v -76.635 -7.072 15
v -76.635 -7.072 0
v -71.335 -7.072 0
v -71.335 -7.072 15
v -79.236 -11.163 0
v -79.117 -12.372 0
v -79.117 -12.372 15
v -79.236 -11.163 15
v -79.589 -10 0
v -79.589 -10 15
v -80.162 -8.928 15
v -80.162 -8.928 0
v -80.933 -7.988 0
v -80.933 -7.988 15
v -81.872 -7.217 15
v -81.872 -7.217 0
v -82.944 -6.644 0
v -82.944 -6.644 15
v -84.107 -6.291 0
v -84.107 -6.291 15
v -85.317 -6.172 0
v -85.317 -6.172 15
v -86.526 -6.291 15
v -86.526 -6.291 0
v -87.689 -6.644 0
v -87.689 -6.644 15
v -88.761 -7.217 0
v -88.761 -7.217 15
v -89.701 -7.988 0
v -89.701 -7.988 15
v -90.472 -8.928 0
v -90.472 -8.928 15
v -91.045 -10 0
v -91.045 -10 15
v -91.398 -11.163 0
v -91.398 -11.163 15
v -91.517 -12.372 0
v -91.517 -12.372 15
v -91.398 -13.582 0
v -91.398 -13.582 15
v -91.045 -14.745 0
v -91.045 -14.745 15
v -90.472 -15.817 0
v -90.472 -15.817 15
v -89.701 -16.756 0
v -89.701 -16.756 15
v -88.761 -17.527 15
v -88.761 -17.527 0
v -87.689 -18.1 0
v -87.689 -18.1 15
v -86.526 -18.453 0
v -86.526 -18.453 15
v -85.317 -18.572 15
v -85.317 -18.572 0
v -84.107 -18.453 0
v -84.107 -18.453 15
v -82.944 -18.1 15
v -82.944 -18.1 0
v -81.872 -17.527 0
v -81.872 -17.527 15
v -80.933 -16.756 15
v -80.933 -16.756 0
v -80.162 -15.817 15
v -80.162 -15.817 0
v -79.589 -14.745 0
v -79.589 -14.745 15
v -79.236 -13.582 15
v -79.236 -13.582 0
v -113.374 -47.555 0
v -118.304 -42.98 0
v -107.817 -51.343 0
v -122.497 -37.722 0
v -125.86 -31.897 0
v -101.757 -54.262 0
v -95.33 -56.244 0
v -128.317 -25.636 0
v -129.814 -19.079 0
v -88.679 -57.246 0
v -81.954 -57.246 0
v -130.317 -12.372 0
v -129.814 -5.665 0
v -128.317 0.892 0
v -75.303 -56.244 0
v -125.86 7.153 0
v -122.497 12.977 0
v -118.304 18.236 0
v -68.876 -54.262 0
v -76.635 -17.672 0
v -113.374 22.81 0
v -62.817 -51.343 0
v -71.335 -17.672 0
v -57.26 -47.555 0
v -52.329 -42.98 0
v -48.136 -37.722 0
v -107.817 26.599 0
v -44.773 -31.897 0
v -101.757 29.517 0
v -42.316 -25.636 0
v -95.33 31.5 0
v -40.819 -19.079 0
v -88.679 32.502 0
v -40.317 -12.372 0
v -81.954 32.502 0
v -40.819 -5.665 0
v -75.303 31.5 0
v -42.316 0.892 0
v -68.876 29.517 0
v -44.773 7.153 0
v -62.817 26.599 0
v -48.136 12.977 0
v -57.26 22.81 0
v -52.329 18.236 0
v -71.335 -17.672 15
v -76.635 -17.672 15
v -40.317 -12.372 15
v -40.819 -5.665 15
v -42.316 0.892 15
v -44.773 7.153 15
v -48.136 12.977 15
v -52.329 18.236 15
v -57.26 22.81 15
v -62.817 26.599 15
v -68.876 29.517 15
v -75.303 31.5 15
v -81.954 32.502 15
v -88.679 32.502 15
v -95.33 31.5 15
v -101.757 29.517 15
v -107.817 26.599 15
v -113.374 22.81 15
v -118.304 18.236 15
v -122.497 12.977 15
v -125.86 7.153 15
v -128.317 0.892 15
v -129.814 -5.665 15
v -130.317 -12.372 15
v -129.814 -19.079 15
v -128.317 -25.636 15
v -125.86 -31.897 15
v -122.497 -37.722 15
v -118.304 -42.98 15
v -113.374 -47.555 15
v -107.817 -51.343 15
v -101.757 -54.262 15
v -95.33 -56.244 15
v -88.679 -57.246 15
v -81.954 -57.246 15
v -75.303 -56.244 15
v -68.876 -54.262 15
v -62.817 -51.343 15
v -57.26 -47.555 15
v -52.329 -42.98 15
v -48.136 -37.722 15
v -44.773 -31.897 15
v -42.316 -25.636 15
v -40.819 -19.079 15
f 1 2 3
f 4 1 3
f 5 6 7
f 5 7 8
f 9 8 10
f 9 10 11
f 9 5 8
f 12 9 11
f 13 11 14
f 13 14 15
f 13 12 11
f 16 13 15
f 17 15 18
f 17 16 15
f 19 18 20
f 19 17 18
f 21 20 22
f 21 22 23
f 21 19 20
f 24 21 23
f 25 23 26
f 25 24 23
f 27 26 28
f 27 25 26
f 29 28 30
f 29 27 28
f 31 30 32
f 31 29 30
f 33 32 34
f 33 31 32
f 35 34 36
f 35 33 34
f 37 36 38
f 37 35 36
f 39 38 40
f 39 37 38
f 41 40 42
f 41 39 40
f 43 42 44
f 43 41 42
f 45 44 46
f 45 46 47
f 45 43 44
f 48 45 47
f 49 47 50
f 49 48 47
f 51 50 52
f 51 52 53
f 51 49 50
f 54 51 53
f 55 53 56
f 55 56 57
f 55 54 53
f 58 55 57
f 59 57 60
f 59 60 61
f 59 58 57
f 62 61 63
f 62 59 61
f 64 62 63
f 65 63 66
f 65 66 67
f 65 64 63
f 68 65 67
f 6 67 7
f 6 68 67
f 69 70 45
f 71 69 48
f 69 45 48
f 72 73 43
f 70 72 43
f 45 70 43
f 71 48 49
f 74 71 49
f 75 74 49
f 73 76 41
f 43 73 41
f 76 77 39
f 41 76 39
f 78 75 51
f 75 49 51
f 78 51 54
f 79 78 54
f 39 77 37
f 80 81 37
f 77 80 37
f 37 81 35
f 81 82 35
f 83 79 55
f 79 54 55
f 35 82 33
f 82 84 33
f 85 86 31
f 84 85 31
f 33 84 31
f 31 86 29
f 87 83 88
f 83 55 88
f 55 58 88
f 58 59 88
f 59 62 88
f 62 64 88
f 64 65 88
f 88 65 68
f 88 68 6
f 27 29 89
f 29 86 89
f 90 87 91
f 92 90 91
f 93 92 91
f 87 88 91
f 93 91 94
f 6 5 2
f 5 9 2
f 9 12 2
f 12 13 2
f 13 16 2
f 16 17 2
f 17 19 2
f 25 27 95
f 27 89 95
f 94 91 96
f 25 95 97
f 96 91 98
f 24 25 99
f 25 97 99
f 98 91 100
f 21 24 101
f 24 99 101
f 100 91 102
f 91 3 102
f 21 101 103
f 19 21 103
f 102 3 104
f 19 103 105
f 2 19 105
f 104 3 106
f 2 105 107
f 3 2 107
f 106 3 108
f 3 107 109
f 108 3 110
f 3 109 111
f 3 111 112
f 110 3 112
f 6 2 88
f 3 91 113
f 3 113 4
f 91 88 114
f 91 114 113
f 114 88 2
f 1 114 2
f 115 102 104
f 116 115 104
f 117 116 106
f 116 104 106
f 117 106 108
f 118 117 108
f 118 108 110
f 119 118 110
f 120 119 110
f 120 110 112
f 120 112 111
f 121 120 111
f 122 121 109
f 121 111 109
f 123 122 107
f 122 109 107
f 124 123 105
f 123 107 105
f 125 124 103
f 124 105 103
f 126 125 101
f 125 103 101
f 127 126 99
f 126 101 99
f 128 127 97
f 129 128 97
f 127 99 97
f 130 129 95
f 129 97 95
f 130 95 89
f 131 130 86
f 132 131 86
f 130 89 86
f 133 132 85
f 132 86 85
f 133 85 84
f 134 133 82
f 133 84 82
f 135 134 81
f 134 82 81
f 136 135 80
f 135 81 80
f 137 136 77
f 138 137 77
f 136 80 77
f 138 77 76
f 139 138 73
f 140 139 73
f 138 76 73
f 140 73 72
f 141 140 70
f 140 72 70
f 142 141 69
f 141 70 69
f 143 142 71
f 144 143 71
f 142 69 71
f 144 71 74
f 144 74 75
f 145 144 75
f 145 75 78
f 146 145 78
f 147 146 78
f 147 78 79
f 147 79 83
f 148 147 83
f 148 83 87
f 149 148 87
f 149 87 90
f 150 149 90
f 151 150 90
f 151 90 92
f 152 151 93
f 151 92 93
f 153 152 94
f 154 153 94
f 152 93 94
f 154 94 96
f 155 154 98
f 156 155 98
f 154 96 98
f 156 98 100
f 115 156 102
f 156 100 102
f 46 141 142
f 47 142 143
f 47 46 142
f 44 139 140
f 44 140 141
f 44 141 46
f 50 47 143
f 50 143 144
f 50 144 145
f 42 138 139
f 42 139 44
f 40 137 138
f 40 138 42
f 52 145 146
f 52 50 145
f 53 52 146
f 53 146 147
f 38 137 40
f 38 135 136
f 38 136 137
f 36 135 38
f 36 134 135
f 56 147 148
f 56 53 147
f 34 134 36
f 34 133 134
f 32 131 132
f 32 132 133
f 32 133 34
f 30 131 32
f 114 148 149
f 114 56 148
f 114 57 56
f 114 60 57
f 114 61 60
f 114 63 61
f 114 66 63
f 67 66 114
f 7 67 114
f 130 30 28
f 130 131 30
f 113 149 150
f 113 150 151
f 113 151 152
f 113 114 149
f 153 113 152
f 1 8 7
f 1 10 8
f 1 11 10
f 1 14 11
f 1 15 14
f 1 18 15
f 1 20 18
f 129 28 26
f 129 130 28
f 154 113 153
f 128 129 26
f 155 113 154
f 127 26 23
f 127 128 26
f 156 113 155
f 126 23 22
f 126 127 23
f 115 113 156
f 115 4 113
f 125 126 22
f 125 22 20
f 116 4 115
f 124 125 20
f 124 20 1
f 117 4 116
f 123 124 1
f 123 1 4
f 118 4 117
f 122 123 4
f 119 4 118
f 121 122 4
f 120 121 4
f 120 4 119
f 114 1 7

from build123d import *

# Parameters (mm, degrees)
SKETCH1_R           = 45
SKETCH1_R_2         = 6.2
SKETCH1_W           = 5.3
SKETCH1_H           = 10.6
BOSS_EXTRUDE1_DEPTH = 15


with BuildPart() as part:
    # Sketch1 → Boss-Extrude1 (new body)
    with BuildSketch(Plane.XY):
        with Locations((-85.316632571, -12.372200494)):
            Circle(SKETCH1_R)
        with Locations((-85.316632571, -12.372200494)):
            Circle(SKETCH1_R_2, mode=Mode.SUBTRACT)
        with Locations((-73.984503587, -12.372200494)):
            Rectangle(SKETCH1_W, SKETCH1_H, mode=Mode.SUBTRACT)
    extrude(amount=BOSS_EXTRUDE1_DEPTH)


solid = part.part
